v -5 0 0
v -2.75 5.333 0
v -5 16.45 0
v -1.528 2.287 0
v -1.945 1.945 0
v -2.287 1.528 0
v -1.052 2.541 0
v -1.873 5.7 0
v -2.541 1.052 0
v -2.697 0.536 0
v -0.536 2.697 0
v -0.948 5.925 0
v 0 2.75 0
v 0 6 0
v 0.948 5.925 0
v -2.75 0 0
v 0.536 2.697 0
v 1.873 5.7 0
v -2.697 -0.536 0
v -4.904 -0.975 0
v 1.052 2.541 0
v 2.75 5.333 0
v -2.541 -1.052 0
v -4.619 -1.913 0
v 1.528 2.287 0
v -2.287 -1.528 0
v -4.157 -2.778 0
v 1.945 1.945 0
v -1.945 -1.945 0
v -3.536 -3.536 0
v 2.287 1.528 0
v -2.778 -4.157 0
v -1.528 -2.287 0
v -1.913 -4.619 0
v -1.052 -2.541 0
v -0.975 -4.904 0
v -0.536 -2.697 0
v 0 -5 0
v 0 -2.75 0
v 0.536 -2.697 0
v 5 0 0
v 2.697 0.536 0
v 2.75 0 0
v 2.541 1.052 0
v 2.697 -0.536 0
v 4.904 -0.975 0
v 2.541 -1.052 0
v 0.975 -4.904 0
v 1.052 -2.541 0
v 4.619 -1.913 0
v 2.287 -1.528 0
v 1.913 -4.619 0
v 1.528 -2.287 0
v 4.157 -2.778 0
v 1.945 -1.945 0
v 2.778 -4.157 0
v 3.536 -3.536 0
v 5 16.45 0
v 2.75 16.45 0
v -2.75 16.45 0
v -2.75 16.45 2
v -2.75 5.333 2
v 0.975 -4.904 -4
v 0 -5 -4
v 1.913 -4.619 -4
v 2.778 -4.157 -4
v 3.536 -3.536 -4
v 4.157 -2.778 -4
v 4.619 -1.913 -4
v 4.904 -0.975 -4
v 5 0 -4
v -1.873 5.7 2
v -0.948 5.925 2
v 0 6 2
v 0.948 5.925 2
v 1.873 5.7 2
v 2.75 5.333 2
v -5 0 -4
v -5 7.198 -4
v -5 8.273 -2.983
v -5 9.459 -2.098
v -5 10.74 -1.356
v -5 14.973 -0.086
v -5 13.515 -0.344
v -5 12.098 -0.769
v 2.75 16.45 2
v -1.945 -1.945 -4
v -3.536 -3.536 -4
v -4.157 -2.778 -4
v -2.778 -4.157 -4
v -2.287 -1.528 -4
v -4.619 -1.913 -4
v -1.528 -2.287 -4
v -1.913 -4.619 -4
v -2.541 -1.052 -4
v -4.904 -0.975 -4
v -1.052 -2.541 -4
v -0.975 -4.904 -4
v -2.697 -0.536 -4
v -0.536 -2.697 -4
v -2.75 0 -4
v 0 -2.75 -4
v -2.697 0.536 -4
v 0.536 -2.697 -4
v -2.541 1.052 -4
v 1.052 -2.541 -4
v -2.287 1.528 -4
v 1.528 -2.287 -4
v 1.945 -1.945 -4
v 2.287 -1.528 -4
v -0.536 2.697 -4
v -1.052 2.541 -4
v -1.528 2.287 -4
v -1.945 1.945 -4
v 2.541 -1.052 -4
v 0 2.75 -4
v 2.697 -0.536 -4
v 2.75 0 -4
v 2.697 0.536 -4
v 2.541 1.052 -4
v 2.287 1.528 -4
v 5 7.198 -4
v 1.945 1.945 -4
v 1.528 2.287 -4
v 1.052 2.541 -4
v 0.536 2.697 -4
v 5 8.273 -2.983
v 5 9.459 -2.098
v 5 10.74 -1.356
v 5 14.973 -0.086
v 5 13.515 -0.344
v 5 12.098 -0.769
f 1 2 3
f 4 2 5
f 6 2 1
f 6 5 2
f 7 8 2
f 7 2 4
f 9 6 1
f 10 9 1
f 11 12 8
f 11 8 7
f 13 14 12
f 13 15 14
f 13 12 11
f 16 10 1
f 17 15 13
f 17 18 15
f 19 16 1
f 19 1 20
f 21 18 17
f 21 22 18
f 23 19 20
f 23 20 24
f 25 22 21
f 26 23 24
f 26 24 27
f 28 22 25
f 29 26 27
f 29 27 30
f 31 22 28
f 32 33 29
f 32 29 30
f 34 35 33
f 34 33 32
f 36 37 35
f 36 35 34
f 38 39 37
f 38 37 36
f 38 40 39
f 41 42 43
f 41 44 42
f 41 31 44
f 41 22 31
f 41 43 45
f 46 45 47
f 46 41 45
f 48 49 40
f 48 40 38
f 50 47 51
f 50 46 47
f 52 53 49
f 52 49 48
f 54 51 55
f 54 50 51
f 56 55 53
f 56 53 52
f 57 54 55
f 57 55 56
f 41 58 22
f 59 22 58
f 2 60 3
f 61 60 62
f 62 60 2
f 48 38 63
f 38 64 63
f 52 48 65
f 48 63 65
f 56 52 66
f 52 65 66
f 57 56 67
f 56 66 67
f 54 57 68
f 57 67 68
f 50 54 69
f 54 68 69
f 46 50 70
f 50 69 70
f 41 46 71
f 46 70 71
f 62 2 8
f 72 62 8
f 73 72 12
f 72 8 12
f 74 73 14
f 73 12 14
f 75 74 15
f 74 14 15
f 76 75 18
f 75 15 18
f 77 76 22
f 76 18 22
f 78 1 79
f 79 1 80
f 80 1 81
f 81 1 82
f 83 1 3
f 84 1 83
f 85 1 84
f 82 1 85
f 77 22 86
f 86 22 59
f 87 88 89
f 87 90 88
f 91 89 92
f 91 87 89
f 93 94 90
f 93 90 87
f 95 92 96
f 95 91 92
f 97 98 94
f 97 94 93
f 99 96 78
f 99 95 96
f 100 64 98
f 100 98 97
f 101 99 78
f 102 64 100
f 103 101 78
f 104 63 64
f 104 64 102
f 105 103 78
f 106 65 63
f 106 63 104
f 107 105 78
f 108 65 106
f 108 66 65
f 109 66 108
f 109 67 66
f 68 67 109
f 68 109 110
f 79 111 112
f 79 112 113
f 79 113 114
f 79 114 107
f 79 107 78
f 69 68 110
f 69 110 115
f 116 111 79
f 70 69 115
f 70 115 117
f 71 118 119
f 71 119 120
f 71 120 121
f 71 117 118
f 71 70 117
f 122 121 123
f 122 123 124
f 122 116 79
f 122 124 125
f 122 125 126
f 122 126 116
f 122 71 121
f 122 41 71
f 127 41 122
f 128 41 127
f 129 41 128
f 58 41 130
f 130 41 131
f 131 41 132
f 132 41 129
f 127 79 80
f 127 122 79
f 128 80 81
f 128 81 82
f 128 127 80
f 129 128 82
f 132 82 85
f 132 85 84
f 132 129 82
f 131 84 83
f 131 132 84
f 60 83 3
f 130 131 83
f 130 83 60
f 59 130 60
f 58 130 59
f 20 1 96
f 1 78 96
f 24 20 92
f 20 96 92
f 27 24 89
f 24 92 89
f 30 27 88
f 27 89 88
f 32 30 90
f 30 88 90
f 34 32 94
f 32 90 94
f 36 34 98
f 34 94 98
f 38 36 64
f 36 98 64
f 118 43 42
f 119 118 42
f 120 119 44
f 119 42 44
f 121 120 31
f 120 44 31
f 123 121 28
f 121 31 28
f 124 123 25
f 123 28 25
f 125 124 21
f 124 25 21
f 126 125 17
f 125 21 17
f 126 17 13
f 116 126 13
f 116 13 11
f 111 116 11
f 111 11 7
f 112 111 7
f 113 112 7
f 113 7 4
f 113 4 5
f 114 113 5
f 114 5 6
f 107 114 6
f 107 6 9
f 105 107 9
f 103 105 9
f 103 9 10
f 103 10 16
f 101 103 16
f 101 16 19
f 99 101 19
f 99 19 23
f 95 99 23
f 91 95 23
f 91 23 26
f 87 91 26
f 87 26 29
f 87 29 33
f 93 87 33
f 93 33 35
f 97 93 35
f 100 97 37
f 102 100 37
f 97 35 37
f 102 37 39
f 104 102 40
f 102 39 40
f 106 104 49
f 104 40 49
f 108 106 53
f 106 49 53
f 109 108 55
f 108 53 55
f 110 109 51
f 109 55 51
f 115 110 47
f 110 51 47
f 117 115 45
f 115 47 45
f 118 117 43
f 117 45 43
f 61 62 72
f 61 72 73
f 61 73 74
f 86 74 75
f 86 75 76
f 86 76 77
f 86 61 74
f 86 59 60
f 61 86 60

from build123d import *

# Parameters (mm, degrees)
F1_DEPTH = 5
F2_R     = 2.75
F3_DEPTH = 4.001
F4_R     = 4.99999
F6_DEPTH = 2


# Not quite as in the source:
# - a fillet or chamfer is up to 0.001 mm smaller than in the source, because OpenCascade refuses the exact size


with BuildPart() as f1:
    # F0 (on Right) → F1 (new body, symmetric)
    with BuildSketch(Plane.YZ):
        with BuildLine():
            Line((16.45, 0), (0, 0))
            Line((0, 0), (-5, 0))
            Line((-5, 0), (-5, -4))
            Line((-5, -4), (7.197973195, -4))
            ThreePointArc((7.197973195, -4), (11.4101587327, -1.0428133754), (16.45, 0))
        make_face()
    extrude(amount=F1_DEPTH, both=True)

    # F2 (on face) → F3 (cut, through all)
    with BuildSketch(Plane.XY):
        Circle(F2_R)
    extrude(amount=-F3_DEPTH, mode=Mode.SUBTRACT)

    # F4 (radius 5 in the source; OpenCascade refuses exactly that, so slightly less here)
    f4_edges = [f1.edges().sort_by_distance(p)[0] for p in [
        (5, -5, -2),
        (-5, -5, -2),
    ]]
    fillet(f4_edges, radius=F4_R)

    # F5 (on face) → F6 (join)
    with BuildSketch(Plane.XY):
        with BuildLine():
            Line((-2.75, 16.45), (-2.75, 5.3326822519))
            ThreePointArc((-2.75, 5.3326822519), (0, 6), (2.75, 5.3326822519))
            Line((2.75, 5.3326822519), (2.75, 16.45))
            Line((2.75, 16.45), (-2.75, 16.45))
        make_face()
    extrude(amount=F6_DEPTH)


solid = f1.part
